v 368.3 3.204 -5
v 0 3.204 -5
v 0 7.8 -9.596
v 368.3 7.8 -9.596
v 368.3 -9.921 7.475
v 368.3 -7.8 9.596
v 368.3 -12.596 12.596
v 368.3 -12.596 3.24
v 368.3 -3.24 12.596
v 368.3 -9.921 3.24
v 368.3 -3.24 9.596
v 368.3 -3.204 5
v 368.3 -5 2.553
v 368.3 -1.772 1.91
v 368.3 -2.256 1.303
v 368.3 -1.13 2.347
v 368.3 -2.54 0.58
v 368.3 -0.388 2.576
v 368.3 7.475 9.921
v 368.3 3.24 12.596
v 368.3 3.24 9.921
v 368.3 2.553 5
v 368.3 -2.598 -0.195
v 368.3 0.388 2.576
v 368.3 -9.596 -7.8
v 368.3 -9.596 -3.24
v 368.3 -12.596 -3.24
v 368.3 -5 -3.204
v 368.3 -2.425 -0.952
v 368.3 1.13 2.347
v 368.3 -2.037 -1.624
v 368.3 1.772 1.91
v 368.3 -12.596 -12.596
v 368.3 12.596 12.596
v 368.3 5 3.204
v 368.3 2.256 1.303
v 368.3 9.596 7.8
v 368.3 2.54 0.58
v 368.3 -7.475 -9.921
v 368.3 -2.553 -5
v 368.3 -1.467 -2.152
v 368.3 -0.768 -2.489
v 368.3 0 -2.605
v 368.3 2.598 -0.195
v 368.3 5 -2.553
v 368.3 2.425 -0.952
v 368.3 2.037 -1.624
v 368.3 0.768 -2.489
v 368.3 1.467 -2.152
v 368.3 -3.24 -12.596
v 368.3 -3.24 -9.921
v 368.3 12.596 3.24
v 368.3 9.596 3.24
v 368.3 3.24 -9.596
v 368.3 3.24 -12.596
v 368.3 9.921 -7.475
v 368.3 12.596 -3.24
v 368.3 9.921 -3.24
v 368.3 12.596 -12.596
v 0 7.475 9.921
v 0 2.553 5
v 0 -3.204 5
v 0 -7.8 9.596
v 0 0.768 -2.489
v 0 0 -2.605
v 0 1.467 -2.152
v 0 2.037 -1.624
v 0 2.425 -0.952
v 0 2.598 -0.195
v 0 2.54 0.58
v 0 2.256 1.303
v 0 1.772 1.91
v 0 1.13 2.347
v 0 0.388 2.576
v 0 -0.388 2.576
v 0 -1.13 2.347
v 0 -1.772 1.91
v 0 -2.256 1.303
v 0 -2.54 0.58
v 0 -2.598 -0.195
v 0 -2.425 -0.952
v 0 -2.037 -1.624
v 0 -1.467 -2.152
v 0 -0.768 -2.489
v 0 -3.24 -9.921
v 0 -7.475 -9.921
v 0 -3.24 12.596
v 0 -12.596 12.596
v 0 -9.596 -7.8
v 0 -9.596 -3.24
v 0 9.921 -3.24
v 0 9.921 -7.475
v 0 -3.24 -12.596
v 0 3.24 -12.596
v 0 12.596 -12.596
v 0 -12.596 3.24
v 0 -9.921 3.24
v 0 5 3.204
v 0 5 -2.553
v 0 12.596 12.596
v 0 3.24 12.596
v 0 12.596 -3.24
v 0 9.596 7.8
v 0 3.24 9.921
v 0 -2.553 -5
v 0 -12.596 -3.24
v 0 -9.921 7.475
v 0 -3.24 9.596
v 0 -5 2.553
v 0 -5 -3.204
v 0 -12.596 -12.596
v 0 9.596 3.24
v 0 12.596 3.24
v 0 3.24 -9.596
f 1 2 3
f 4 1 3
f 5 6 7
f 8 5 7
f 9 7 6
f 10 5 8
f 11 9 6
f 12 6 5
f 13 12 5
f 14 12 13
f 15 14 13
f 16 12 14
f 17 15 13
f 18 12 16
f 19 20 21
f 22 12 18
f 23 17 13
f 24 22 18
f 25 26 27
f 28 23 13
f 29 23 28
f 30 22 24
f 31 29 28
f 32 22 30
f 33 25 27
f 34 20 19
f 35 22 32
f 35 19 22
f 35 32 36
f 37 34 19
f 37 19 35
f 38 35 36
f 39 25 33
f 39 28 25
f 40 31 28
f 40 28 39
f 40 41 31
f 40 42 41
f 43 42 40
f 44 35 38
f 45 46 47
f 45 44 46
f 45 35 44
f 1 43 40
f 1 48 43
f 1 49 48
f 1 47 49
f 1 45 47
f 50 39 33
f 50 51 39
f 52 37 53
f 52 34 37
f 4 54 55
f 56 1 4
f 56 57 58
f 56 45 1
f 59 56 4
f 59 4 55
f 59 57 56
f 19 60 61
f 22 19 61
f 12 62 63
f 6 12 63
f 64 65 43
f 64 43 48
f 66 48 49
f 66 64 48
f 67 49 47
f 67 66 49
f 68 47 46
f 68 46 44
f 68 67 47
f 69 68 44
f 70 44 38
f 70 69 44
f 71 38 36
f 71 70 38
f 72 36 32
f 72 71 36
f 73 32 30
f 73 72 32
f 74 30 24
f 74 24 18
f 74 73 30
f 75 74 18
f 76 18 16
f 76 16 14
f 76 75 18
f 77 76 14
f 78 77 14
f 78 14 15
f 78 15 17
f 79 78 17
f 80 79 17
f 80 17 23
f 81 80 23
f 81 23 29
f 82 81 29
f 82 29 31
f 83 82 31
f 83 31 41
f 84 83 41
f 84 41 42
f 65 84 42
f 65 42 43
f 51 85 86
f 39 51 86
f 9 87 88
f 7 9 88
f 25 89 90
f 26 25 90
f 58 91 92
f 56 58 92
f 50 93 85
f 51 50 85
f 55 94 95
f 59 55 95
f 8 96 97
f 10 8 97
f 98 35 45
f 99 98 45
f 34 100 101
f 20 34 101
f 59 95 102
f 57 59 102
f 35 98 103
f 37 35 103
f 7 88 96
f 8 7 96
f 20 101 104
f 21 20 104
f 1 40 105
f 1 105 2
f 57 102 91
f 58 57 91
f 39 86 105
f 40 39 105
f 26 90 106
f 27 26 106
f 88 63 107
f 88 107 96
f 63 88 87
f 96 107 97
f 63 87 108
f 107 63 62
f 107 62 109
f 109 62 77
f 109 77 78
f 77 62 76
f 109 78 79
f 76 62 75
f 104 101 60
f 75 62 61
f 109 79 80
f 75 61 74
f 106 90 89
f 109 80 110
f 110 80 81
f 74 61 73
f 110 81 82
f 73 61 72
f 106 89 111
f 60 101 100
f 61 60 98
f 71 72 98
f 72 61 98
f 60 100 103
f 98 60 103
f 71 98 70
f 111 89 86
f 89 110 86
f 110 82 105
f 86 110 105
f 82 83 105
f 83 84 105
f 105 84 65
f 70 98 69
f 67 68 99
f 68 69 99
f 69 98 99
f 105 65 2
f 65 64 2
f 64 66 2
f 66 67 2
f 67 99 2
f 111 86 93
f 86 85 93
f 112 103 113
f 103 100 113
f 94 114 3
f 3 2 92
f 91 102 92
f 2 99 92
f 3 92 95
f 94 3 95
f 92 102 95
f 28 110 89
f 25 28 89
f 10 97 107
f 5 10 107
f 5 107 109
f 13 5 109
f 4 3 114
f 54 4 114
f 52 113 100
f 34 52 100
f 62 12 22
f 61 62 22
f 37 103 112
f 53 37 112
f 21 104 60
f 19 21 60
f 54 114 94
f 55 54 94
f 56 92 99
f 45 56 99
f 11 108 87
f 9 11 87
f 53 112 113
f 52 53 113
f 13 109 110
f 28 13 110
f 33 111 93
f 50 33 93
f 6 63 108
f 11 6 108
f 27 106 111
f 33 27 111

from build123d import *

# Parameters (mm, degrees)
SKETCH1_R           = 2.605
BOSS_EXTRUDE1_DEPTH = 368.3
CIRPATTERN1_COUNT   = 4


with BuildPart() as part:
    # Sketch1 → Boss-Extrude1 (new body)
    with BuildSketch(Plane(origin=(0, 0, 0), x_dir=(0, 0, -1), z_dir=(1, 0, 0))):
        Polygon((5, -5), (5, 3.203948776), (9.596194078, 7.800142853), (9.596194078, 3.24), (12.596194078, 3.24), (12.596194078, 12.596194078), (3.24, 12.596194078), (3.24, 9.921463197), (7.474873734, 9.921463197), (2.553410537, 5), (-5, 5), (-5, -5), align=None)
        Circle(SKETCH1_R, mode=Mode.SUBTRACT)
    boss_extrude1 = extrude(amount=BOSS_EXTRUDE1_DEPTH)

    # CirPattern1: Boss-Extrude1 ×4 about axis
    cirpattern1_axis = Axis((0, 0, 0), (1, 0, 0))
    for i in range(1, CIRPATTERN1_COUNT):
        add(boss_extrude1.rotate(cirpattern1_axis, i * 360 / CIRPATTERN1_COUNT))


solid = part.part
